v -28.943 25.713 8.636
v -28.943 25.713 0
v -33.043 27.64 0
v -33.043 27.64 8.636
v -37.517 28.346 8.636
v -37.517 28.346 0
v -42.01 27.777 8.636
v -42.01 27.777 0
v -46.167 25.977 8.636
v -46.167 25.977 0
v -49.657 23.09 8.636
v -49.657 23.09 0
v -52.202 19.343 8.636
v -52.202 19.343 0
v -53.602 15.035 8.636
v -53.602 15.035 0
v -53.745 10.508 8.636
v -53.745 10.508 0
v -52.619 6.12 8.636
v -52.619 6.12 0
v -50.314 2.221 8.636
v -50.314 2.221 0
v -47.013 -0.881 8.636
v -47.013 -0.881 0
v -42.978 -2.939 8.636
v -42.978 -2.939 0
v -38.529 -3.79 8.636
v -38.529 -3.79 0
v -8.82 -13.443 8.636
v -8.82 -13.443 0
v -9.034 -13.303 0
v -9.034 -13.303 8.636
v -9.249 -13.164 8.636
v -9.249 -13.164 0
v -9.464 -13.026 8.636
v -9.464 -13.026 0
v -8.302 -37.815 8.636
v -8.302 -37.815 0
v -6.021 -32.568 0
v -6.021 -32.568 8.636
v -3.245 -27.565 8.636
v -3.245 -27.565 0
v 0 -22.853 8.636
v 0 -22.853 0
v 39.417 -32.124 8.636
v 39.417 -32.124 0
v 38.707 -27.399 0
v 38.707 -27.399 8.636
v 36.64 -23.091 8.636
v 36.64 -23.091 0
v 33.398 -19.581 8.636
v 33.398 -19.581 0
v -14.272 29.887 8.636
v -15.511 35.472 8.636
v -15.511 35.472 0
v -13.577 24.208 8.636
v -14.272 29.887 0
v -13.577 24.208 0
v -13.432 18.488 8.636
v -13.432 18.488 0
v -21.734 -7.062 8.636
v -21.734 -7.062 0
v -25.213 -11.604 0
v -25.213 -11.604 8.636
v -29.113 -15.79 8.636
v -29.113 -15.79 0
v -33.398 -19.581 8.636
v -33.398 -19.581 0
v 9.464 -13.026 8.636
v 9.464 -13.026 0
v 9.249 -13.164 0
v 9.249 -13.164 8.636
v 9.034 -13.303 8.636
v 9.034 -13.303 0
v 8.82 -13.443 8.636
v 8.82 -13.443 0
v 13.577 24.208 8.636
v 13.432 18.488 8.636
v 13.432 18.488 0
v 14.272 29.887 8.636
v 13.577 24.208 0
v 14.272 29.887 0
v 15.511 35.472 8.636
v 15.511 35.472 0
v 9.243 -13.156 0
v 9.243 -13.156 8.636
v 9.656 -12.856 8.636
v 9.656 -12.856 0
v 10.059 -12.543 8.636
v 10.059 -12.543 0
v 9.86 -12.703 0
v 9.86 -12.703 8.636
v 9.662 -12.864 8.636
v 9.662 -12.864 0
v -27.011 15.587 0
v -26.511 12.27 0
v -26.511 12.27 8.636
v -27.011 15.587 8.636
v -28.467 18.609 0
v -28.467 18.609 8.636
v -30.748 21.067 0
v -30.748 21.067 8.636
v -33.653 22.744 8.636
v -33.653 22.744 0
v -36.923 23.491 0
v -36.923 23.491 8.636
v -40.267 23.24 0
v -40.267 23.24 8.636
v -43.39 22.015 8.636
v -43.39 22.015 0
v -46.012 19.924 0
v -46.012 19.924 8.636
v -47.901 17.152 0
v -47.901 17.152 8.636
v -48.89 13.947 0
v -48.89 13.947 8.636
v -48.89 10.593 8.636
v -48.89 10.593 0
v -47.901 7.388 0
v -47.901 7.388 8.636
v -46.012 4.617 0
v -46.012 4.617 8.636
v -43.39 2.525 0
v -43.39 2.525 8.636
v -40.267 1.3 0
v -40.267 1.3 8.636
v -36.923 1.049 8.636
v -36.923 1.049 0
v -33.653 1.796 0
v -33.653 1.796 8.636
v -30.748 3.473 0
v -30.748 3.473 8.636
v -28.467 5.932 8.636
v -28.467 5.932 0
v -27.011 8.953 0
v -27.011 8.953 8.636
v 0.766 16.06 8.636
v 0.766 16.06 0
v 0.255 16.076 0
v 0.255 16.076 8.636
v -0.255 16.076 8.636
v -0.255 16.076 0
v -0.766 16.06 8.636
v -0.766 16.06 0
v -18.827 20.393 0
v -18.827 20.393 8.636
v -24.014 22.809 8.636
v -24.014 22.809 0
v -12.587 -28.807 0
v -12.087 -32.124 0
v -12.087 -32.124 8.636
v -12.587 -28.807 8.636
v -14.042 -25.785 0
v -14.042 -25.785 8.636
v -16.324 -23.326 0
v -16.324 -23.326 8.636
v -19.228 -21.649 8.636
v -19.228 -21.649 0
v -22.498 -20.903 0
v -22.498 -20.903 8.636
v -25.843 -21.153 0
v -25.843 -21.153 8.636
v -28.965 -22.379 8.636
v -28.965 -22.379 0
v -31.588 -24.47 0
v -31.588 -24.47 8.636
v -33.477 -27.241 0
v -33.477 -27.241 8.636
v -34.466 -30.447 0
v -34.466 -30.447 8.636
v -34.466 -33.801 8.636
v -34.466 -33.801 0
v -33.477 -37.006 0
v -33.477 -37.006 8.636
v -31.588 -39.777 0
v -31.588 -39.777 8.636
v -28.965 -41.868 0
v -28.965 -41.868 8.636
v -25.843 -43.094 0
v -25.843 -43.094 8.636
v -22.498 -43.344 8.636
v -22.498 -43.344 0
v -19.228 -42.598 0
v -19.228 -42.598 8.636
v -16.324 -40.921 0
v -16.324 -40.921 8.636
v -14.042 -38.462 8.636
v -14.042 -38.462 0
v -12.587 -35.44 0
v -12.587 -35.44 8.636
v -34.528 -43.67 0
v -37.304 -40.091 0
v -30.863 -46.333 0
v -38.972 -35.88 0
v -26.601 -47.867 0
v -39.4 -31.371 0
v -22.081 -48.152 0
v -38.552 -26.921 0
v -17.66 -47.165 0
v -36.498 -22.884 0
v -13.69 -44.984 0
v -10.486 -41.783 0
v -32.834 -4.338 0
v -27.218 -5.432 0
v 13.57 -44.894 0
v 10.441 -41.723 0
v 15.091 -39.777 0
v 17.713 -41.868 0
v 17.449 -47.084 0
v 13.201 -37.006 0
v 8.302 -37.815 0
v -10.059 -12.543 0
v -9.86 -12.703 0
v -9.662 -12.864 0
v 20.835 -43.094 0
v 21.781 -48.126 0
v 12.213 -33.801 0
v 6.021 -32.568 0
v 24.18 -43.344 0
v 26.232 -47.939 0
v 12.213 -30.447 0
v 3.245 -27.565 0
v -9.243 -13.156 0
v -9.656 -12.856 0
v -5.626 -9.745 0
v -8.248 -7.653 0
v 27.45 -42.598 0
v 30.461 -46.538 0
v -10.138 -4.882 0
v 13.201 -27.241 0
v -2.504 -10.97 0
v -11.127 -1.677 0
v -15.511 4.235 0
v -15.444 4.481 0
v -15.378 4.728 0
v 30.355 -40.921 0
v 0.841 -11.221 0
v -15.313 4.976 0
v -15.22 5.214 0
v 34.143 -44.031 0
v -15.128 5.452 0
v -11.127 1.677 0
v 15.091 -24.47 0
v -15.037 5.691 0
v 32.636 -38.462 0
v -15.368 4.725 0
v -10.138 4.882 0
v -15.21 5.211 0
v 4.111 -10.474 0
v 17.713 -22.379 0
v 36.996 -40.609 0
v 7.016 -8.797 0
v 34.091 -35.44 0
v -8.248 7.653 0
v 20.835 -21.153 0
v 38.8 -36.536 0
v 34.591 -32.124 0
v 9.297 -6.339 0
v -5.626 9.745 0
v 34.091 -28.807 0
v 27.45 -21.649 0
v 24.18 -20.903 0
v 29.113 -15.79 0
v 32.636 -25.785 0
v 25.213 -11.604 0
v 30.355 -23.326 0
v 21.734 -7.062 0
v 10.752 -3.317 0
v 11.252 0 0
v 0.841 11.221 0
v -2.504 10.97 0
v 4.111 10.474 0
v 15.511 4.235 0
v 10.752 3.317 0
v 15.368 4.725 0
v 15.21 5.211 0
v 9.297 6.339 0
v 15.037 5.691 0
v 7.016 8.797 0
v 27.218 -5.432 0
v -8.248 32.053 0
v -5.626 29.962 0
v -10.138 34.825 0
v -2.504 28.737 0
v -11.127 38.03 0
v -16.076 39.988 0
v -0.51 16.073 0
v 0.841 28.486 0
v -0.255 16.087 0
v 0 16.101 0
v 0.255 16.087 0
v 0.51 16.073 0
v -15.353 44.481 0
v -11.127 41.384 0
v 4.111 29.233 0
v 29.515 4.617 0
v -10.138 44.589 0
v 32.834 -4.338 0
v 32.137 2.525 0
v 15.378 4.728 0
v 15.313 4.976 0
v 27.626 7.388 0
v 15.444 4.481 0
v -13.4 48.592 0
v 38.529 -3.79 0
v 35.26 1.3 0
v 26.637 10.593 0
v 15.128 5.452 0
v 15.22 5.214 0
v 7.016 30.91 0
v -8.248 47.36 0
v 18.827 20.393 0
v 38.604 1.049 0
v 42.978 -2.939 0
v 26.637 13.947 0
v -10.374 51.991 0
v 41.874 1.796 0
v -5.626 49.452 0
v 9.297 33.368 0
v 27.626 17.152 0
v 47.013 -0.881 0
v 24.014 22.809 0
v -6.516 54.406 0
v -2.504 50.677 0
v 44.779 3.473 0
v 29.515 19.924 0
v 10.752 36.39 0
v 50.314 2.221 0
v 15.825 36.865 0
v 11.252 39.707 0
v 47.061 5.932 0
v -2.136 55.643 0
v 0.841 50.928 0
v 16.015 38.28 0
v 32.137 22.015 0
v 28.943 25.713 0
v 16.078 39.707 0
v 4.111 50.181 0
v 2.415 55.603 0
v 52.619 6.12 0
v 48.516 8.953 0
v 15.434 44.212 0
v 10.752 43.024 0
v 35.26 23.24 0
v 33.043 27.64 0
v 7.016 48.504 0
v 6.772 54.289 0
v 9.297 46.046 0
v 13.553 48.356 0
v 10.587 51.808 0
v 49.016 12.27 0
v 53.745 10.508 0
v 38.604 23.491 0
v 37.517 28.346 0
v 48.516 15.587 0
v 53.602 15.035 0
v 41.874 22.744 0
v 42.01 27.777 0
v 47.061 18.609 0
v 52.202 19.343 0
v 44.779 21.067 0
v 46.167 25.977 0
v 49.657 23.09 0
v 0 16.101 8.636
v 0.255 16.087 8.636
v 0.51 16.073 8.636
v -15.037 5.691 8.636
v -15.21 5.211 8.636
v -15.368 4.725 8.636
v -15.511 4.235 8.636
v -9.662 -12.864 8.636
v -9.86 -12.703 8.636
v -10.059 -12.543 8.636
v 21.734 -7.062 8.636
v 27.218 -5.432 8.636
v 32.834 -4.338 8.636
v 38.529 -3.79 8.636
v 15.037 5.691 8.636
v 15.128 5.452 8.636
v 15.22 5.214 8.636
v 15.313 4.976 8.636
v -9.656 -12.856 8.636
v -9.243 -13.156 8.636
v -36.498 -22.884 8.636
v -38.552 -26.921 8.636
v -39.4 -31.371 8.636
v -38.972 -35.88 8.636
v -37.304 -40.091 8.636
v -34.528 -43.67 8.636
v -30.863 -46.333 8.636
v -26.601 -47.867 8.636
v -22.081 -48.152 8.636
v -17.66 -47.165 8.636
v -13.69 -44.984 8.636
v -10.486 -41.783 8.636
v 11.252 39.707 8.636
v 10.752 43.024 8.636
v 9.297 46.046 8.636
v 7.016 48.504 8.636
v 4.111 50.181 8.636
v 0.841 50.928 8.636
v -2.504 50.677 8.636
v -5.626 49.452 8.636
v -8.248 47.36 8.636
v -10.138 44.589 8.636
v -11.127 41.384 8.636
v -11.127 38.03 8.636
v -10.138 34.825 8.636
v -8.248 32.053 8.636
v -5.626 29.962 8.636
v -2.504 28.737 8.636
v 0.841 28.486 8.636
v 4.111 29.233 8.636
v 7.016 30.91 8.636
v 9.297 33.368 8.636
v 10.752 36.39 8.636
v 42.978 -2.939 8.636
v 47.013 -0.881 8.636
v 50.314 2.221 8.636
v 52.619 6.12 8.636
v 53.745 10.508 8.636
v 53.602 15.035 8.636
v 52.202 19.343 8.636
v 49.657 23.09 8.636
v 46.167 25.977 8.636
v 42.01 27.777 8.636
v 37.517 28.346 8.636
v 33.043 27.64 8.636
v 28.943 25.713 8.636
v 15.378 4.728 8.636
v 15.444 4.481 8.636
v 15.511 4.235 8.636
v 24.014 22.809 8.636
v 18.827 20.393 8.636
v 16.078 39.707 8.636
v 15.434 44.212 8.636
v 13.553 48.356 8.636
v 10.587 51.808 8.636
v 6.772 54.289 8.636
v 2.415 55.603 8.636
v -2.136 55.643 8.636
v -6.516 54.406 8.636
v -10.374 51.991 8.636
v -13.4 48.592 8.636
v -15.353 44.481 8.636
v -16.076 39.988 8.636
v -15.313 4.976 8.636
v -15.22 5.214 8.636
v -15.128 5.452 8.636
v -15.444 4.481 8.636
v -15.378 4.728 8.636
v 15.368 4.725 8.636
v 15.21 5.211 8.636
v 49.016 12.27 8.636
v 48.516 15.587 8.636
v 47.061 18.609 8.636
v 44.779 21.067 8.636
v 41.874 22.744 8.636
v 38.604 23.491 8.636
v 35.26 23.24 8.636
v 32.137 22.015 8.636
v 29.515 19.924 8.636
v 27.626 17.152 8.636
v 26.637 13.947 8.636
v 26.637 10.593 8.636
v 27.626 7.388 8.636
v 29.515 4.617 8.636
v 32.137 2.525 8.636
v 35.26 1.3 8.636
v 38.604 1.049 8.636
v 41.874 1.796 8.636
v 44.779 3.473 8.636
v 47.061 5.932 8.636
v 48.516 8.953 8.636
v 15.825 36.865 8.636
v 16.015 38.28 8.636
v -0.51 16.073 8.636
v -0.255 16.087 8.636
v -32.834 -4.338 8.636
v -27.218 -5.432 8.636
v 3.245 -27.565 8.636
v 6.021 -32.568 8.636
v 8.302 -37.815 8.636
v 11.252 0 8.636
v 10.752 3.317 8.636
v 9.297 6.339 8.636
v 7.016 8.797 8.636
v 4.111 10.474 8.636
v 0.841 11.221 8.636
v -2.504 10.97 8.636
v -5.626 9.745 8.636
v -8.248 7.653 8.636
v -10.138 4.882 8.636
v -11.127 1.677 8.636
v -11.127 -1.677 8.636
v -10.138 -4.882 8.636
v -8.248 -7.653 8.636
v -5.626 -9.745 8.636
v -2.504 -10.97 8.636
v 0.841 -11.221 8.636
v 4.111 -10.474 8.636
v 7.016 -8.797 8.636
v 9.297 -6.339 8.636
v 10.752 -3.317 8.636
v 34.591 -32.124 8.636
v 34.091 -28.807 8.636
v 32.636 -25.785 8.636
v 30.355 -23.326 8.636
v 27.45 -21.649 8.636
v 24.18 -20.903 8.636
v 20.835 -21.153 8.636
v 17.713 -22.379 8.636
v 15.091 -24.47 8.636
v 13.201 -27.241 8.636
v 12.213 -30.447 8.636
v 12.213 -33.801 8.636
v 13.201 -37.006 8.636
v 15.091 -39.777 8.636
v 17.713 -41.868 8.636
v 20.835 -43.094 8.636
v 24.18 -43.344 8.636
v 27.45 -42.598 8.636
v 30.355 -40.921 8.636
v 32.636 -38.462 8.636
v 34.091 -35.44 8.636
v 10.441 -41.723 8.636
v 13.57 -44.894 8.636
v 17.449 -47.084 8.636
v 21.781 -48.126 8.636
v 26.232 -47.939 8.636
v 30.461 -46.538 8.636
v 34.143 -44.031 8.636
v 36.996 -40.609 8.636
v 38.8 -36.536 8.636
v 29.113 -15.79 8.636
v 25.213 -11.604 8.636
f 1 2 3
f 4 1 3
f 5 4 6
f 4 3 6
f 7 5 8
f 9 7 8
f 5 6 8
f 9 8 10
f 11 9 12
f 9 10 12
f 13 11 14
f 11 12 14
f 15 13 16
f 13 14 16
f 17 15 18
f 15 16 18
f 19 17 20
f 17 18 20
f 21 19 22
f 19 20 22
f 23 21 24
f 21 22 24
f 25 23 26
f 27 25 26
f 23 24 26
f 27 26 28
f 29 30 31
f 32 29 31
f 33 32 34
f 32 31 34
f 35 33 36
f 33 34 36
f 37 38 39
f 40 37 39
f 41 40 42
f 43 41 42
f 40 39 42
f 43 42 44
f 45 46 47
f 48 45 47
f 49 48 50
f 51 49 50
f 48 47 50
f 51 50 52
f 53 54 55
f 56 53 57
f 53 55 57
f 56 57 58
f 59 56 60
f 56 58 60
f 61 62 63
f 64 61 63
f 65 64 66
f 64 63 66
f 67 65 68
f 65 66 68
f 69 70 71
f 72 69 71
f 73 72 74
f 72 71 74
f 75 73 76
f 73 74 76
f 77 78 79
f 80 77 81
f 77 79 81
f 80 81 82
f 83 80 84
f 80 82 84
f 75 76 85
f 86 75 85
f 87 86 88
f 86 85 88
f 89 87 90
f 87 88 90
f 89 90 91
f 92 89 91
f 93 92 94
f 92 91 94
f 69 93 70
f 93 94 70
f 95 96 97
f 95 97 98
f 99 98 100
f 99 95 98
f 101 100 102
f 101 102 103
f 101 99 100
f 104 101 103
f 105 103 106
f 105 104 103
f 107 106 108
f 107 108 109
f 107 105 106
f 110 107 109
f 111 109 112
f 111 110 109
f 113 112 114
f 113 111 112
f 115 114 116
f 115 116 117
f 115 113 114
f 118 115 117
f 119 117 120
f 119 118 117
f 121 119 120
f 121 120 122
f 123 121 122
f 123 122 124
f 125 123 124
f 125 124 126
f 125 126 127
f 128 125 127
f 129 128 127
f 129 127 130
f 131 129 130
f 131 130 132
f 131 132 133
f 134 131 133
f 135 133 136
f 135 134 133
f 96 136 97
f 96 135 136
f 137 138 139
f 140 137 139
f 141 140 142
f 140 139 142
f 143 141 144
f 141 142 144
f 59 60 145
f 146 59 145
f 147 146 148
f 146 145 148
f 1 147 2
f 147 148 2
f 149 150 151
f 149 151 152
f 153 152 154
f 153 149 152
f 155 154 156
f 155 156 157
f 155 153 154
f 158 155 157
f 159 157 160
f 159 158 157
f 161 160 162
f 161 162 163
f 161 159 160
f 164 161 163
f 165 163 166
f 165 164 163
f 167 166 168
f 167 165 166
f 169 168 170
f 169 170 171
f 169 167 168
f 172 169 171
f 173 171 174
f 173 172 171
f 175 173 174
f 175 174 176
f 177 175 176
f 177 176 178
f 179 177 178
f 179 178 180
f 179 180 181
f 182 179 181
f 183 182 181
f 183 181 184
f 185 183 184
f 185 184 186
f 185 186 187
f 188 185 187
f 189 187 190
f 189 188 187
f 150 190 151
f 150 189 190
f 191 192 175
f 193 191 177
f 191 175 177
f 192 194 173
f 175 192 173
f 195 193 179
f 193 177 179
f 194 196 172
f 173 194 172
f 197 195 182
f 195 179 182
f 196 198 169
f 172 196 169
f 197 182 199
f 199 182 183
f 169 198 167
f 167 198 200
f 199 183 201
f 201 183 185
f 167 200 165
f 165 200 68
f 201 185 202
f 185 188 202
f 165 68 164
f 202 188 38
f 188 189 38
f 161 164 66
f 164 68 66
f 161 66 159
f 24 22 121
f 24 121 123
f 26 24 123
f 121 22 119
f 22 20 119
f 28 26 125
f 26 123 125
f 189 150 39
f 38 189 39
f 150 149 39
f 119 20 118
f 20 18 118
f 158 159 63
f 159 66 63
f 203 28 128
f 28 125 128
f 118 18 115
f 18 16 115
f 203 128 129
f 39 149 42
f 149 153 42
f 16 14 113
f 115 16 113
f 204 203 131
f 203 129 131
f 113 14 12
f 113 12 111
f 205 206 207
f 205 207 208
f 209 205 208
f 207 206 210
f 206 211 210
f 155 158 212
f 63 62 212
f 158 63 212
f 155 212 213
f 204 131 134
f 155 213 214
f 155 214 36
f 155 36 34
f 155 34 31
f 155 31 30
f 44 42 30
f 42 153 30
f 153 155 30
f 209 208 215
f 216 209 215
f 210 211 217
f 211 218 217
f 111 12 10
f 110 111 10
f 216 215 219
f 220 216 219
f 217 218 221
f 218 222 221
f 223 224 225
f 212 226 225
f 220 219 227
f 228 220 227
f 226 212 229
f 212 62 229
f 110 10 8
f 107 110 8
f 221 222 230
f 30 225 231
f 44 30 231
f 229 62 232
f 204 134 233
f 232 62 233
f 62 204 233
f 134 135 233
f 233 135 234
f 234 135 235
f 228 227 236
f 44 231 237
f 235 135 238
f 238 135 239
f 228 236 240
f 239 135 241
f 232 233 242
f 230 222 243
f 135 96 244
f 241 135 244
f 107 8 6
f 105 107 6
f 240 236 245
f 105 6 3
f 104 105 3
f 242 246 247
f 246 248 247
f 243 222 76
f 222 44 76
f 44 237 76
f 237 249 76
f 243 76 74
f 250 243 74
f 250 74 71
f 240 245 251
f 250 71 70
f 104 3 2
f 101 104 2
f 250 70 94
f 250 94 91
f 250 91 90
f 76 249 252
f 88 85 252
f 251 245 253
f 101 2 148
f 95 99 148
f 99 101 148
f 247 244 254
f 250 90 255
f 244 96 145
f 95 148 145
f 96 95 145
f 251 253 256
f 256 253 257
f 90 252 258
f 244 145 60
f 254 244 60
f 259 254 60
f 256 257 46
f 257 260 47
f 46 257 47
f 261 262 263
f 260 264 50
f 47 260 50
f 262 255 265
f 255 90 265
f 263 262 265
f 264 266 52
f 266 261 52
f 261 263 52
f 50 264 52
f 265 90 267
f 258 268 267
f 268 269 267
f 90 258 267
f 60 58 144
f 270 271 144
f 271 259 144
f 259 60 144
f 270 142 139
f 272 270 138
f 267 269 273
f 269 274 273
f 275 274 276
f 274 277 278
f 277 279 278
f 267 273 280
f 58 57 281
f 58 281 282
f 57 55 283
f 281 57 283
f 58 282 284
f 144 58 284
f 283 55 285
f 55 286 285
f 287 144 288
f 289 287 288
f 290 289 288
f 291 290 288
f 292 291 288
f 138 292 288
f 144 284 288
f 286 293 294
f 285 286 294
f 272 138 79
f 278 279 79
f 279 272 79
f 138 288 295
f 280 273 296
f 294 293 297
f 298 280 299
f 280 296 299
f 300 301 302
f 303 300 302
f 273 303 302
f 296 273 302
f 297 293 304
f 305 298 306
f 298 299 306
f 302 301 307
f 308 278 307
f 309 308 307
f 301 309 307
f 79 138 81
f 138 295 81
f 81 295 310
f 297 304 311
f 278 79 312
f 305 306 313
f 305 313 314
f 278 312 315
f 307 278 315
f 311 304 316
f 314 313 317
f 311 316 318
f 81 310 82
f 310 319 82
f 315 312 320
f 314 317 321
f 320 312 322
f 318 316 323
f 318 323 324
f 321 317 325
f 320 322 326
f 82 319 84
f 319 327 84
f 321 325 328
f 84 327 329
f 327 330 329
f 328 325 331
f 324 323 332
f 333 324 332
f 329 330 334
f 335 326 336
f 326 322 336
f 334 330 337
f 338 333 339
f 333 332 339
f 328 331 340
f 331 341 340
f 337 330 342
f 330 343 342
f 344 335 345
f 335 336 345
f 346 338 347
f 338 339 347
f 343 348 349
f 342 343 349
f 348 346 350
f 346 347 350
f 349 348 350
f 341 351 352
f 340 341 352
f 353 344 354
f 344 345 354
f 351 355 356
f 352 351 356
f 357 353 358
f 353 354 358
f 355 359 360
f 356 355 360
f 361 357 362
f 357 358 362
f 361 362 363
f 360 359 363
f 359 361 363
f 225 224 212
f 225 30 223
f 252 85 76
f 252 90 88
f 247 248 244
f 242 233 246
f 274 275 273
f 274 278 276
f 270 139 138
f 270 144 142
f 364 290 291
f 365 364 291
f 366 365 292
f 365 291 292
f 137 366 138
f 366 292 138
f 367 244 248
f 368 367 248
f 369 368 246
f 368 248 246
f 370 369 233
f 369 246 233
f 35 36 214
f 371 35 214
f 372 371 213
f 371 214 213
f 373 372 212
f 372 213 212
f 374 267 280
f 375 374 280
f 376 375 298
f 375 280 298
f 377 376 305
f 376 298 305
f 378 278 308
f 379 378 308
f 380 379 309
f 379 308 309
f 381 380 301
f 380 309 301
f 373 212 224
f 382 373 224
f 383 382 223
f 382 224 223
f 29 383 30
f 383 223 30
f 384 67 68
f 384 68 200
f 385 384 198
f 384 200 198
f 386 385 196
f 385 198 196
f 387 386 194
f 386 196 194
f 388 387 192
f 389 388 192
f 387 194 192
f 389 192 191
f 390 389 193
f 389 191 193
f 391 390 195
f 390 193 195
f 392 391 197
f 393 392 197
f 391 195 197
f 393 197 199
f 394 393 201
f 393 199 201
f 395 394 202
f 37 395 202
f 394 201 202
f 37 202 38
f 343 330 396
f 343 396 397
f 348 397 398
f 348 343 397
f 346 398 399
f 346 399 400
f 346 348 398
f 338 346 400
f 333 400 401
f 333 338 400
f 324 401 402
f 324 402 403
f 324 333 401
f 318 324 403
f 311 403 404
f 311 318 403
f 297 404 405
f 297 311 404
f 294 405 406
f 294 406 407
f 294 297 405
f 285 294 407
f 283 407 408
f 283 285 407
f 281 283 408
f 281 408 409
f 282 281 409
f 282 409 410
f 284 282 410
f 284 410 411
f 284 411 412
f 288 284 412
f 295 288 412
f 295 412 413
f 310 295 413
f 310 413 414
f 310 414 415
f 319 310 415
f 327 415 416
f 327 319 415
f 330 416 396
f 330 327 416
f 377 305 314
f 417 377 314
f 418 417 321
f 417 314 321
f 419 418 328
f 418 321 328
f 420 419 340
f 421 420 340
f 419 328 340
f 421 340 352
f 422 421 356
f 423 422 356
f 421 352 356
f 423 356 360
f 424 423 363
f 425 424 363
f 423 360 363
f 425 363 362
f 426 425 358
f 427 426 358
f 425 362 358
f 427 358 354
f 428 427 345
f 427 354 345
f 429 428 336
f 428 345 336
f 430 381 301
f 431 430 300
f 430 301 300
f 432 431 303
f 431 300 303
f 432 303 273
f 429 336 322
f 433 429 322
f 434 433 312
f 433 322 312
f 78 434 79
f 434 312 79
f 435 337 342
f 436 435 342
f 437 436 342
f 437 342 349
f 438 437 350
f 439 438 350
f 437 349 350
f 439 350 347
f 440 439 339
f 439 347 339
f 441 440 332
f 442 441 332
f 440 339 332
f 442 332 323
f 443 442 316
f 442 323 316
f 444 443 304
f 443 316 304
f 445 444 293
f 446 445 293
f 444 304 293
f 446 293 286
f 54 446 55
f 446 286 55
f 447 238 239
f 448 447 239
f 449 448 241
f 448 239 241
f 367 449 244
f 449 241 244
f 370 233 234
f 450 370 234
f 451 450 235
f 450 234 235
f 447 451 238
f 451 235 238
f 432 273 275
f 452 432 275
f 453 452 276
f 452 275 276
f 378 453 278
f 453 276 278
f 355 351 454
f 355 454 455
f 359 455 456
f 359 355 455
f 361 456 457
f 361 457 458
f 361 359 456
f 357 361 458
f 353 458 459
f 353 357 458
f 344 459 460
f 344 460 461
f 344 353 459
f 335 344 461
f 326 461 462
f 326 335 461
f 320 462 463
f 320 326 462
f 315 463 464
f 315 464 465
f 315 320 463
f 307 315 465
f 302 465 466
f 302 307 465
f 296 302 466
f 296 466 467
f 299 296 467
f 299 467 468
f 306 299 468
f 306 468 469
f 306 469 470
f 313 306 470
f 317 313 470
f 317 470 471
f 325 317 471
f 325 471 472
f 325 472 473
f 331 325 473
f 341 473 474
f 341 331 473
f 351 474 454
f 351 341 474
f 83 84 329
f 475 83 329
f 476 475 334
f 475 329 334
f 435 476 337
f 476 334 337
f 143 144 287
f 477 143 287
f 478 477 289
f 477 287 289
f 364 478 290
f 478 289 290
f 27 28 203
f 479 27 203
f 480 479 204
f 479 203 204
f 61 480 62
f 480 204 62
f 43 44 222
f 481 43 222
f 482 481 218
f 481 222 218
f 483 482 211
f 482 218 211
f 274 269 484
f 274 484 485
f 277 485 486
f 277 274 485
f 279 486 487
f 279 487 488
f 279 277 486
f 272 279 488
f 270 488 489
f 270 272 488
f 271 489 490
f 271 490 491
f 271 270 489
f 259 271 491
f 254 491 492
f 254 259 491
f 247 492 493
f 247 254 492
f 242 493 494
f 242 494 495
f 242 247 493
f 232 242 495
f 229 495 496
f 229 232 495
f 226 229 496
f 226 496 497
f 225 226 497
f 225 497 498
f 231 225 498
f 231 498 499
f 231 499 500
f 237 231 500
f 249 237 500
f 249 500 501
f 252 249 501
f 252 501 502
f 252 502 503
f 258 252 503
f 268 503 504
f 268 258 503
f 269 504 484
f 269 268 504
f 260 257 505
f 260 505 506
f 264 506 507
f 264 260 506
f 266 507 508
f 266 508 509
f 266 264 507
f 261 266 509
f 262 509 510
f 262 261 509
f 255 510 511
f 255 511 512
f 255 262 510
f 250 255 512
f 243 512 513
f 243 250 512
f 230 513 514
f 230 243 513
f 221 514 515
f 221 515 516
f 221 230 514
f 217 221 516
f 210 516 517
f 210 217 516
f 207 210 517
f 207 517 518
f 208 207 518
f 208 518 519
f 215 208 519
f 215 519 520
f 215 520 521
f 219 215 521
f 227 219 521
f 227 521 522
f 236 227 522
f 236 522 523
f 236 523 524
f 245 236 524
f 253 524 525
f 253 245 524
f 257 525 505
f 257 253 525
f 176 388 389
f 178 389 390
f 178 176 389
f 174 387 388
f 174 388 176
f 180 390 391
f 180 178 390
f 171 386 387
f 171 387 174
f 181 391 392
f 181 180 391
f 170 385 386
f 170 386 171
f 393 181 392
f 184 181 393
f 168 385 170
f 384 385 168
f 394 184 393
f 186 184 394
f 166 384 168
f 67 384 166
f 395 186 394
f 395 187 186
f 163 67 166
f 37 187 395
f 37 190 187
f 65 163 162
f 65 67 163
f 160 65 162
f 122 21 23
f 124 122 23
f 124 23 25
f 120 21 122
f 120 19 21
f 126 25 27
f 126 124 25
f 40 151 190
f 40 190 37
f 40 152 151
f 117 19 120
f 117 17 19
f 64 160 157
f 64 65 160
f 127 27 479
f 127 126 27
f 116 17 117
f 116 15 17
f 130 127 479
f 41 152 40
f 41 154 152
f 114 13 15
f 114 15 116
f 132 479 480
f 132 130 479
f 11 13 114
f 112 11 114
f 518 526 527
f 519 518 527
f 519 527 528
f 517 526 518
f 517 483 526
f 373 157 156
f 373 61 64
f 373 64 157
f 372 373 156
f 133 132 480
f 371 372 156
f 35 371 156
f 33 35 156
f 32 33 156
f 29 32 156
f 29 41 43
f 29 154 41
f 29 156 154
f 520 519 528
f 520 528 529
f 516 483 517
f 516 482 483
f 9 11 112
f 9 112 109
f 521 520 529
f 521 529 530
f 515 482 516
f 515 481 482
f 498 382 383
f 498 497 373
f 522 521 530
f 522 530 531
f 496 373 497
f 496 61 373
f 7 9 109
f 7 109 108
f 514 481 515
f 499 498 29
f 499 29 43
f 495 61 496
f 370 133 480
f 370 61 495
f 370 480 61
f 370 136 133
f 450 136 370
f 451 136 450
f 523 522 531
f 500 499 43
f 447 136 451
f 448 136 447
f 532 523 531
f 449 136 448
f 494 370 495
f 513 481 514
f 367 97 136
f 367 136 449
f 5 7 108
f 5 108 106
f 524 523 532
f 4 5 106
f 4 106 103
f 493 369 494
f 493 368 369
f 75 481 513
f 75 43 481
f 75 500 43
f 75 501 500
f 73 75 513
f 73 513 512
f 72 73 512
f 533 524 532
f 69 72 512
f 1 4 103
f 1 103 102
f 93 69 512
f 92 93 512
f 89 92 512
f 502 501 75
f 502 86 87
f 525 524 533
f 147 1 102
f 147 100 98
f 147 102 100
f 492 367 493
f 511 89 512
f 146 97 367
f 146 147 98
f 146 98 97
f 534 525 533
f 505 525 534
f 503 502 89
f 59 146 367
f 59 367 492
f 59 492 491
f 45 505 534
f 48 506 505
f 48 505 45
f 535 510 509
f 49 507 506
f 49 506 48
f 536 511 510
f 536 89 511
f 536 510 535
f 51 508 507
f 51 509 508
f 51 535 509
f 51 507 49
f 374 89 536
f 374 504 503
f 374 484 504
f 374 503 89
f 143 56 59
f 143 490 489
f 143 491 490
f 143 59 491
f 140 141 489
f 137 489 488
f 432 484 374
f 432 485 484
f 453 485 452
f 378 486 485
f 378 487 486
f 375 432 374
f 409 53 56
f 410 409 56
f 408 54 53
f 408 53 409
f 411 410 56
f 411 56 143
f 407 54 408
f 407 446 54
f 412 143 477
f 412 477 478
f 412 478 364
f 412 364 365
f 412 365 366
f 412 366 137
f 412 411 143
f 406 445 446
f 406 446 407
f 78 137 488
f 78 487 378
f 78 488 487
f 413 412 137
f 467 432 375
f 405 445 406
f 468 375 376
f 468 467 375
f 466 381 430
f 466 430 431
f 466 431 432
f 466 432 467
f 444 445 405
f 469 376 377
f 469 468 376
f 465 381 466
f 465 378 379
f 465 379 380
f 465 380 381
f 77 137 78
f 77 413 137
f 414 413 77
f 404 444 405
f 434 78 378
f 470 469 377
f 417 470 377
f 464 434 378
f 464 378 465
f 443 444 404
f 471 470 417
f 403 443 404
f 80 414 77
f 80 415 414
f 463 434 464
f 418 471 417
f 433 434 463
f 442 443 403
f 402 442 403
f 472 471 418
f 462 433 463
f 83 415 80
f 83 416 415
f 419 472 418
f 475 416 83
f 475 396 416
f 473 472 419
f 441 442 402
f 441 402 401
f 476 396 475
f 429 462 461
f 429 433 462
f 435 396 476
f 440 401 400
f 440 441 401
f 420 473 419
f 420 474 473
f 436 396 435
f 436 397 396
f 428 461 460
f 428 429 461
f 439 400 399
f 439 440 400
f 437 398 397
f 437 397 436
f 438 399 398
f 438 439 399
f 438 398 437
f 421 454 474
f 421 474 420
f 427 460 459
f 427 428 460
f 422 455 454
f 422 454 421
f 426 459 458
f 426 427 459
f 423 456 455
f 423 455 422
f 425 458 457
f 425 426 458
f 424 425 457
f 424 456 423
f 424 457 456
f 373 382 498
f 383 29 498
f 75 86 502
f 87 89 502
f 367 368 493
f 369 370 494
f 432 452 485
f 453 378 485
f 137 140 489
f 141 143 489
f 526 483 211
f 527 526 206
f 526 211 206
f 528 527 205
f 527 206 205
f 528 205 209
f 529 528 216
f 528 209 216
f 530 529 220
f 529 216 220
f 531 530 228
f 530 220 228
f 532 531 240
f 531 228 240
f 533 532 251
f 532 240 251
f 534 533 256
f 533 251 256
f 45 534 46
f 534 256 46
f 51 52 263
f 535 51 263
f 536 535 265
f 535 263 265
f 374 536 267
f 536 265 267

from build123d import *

# Parameters (mm, degrees)
F0_R     = 11.2522
F1_DEPTH = 8.636


with BuildPart() as f1:
    # F0 (on Top) → F1 (new body)
    with BuildSketch(Plane.XY):
        with BuildLine():
            ThreePointArc((10.0592163849, -12.5427541219), (14.4955615296, -6.9560916599), (16.0782, 0))
            ThreePointArc((16.0782, 0), (15.9356487874, 2.1362614454), (15.5105229014, 4.2346422002))
            ThreePointArc((15.5105229014, 4.2346422002), (15.2912768803, 4.968437039), (15.0373368529, 5.6909591117))
            ThreePointArc((15.0373368529, 5.6909591117), (9.4505288434, 13.007537039), (0.7656311095, 16.0599602815))
            ThreePointArc((0.7656311095, 16.0599602815), (0, 16.0782), (-0.7656311095, 16.0599602815))
            ThreePointArc((-0.7656311095, 16.0599602815), (-9.4505288434, 13.007537039), (-15.0373368529, 5.6909591117))
            ThreePointArc((-15.0373368529, 5.6909591117), (-15.2912768803, 4.968437039), (-15.5105229014, 4.2346422002))
            ThreePointArc((-15.5105229014, 4.2346422002), (-15.2912768803, -4.968437039), (-10.0592163849, -12.5427541219))
            ThreePointArc((-10.0592163849, -12.5427541219), (-9.4505288434, -13.007537039), (-8.8203992269, -13.4428074716))
            ThreePointArc((-8.8203992269, -13.4428074716), (0, -16.0782), (8.8203992269, -13.4428074716))
            ThreePointArc((8.8203992269, -13.4428074716), (9.4505288434, -13.007537039), (10.0592163849, -12.5427541219))
        make_face()
        Circle(F0_R, mode=Mode.SUBTRACT)
        with BuildLine():
            ThreePointArc((0.7656311095, 16.0599602815), (9.4505288434, 13.007537039), (15.0373368529, 5.6909591117))
            ThreePointArc((15.0373368529, 5.6909591117), (15.1741938942, 5.3328401038), (15.3133632508, 4.9756133358))
            ThreePointArc((15.3133632508, 4.9756133358), (13.983030327, 11.6776288921), (13.4324519852, 18.4881840601))
            ThreePointArc((13.4324519852, 18.4881840601), (6.7850910488, 16.9072378917), (0, 16.1014229843))
            ThreePointArc((0, 16.1014229843), (0.3827485418, 16.079454203), (0.7656311095, 16.0599602815))
        make_face()
        with BuildLine():
            ThreePointArc((15.5105229014, 4.2346422002), (15.9356487874, 2.1362614454), (16.0782, 0))
            ThreePointArc((16.0782, 0), (14.4955615296, -6.9560916599), (10.0592163849, -12.5427541219))
            ThreePointArc((10.0592163849, -12.5427541219), (9.7609161203, -12.7835777623), (9.4641789711, -13.0263248279))
            ThreePointArc((9.4641789711, -13.0263248279), (15.4270790567, -9.6900663284), (21.7341638644, -7.0618579207))
            ThreePointArc((21.7341638644, -7.0618579207), (18.176447212, -1.2283812192), (15.3133632508, 4.9756133358))
            ThreePointArc((15.3133632508, 4.9756133358), (15.4107455022, 4.6048091142), (15.5105229014, 4.2346422002))
        make_face()
        with BuildLine():
            ThreePointArc((13.4324519852, 18.4881840601), (13.983030327, 11.6776288921), (15.3133632508, 4.9756133358))
            ThreePointArc((15.3133632508, 4.9756133358), (18.176447212, -1.2283812192), (21.7341638644, -7.0618579207))
            ThreePointArc((21.7341638644, -7.0618579207), (30.0130318433, -4.8169203604), (38.5291644649, -3.789844495))
            ThreePointArc((38.5291644649, -3.789844495), (22.4722564751, 7.3016787476), (28.9431341285, 25.7129232581))
            ThreePointArc((28.9431341285, 25.7129232581), (21.4497380646, 21.5381879262), (13.4324519852, 18.4881840601))
        make_face()
        with BuildLine():
            ThreePointArc((53.8417333554, 12.2701157865), (45.4020008846, 26.4179894446), (28.9431341285, 25.7129232581))
            ThreePointArc((28.9431341285, 25.7129232581), (22.4722564751, 7.3016787476), (38.5291644649, -3.789844495))
            ThreePointArc((38.5291644649, -3.789844495), (49.4000810682, 1.1751046298), (53.8417333554, 12.2701157865))
        make_face()
        with Locations((37.7635333554, 12.2701157865)):
            Circle(F0_R, mode=Mode.SUBTRACT)
        with BuildLine():
            ThreePointArc((21.7341638644, -7.0618579207), (15.4270790567, -9.6900663284), (9.4641789711, -13.0263248279))
            ThreePointArc((9.4641789711, -13.0263248279), (4.4485711229, -17.6664192363), (0, -22.8526522788))
            ThreePointArc((0, -22.8526522788), (4.693373395, -30.0325997603), (8.301810296, -37.8145392867))
            ThreePointArc((8.301810296, -37.8145392867), (13.8886183055, -19.1160431361), (33.3983635338, -19.5808260531))
            ThreePointArc((33.3983635338, -19.5808260531), (27.1123675633, -13.7442470619), (21.7341638644, -7.0618579207))
        make_face()
        with BuildLine():
            ThreePointArc((9.4641789711, -13.0263248279), (9.1416159705, -13.2335256587), (8.8203992269, -13.4428074716))
            ThreePointArc((8.8203992269, -13.4428074716), (0, -16.0782), (-8.8203992269, -13.4428074716))
            ThreePointArc((-8.8203992269, -13.4428074716), (-9.1416159705, -13.2335256587), (-9.4641789711, -13.0263248279))
            ThreePointArc((-9.4641789711, -13.0263248279), (-4.4485711229, -17.6664192363), (0, -22.8526522788))
            ThreePointArc((0, -22.8526522788), (4.4485711229, -17.6664192363), (9.4641789711, -13.0263248279))
        make_face()
        with BuildLine():
            ThreePointArc((-8.301810296, -37.8145392867), (-4.693373395, -30.0325997603), (0, -22.8526522788))
            ThreePointArc((0, -22.8526522788), (-4.4485711229, -17.6664192363), (-9.4641789711, -13.0263248279))
            ThreePointArc((-9.4641789711, -13.0263248279), (-15.4270790567, -9.6900663284), (-21.7341638644, -7.0618579207))
            ThreePointArc((-21.7341638644, -7.0618579207), (-27.1123675633, -13.7442470619), (-33.3983635338, -19.5808260531))
            ThreePointArc((-33.3983635338, -19.5808260531), (-16.3830554891, -17.6280186454), (-7.2609471489, -32.123580175))
            ThreePointArc((-7.2609471489, -32.123580175), (-7.5233034372, -35.0162610986), (-8.301810296, -37.8145392867))
        make_face()
        with BuildLine():
            ThreePointArc((-33.3983635338, -19.5808260531), (-32.7896759923, -45.131117214), (-8.301810296, -37.8145392867))
            ThreePointArc((-8.301810296, -37.8145392867), (-7.5233034372, -35.0162610986), (-7.2609471489, -32.123580175))
            ThreePointArc((-7.2609471489, -32.123580175), (-16.3830554891, -17.6280186454), (-33.3983635338, -19.5808260531))
        make_face()
        with Locations((-23.3391471489, -32.123580175)):
            Circle(F0_R, mode=Mode.SUBTRACT)
        with BuildLine():
            ThreePointArc((-9.4641789711, -13.0263248279), (-9.7609161203, -12.7835777623), (-10.0592163849, -12.5427541219))
            ThreePointArc((-10.0592163849, -12.5427541219), (-15.2912768803, -4.968437039), (-15.5105229014, 4.2346422002))
            ThreePointArc((-15.5105229014, 4.2346422002), (-15.4107455022, 4.6048091142), (-15.3133632508, 4.9756133358))
            ThreePointArc((-15.3133632508, 4.9756133358), (-18.176447212, -1.2283812192), (-21.7341638644, -7.0618579207))
            ThreePointArc((-21.7341638644, -7.0618579207), (-15.4270790567, -9.6900663284), (-9.4641789711, -13.0263248279))
        make_face()
        with BuildLine():
            ThreePointArc((39.4173471489, -32.123580175), (37.8347086786, -25.1674885151), (33.3983635338, -19.5808260531))
            ThreePointArc((33.3983635338, -19.5808260531), (13.8886183055, -19.1160431361), (8.301810296, -37.8145392867))
            ThreePointArc((8.301810296, -37.8145392867), (26.2318280725, -47.9394238868), (39.4173471489, -32.123580175))
        make_face()
        with Locations((23.3391471489, -32.123580175)):
            Circle(F0_R, mode=Mode.SUBTRACT)
        with BuildLine():
            ThreePointArc((-21.6853333554, 12.2701157865), (-23.6156596973, 19.9085833157), (-28.9431341285, 25.7129232581))
            ThreePointArc((-28.9431341285, 25.7129232581), (-53.0548102357, 17.2385528255), (-38.5291644649, -3.789844495))
            ThreePointArc((-38.5291644649, -3.789844495), (-26.6685221987, 0.6335680737), (-21.6853333554, 12.2701157865))
        make_face()
        with Locations((-37.7635333554, 12.2701157865)):
            Circle(F0_R, mode=Mode.SUBTRACT)
        with BuildLine():
            ThreePointArc((-15.3133632508, 4.9756133358), (-13.983030327, 11.6776288921), (-13.4324519852, 18.4881840601))
            ThreePointArc((-13.4324519852, 18.4881840601), (-21.4497380646, 21.5381879262), (-28.9431341285, 25.7129232581))
            ThreePointArc((-28.9431341285, 25.7129232581), (-23.6156596973, 19.9085833157), (-21.6853333554, 12.2701157865))
            ThreePointArc((-21.6853333554, 12.2701157865), (-26.6685221987, 0.6335680737), (-38.5291644649, -3.789844495))
            ThreePointArc((-38.5291644649, -3.789844495), (-30.0130318433, -4.8169203604), (-21.7341638644, -7.0618579207))
            ThreePointArc((-21.7341638644, -7.0618579207), (-18.176447212, -1.2283812192), (-15.3133632508, 4.9756133358))
        make_face()
        with BuildLine():
            ThreePointArc((-15.0373368529, 5.6909591117), (-9.4505288434, 13.007537039), (-0.7656311095, 16.0599602815))
            ThreePointArc((-0.7656311095, 16.0599602815), (-0.3827485418, 16.079454203), (0, 16.1014229843))
            ThreePointArc((0, 16.1014229843), (-6.7850910488, 16.9072378917), (-13.4324519852, 18.4881840601))
            ThreePointArc((-13.4324519852, 18.4881840601), (-13.983030327, 11.6776288921), (-15.3133632508, 4.9756133358))
            ThreePointArc((-15.3133632508, 4.9756133358), (-15.1741938942, 5.3328401038), (-15.0373368529, 5.6909591117))
        make_face()
        with BuildLine():
            ThreePointArc((0, 16.1014229843), (6.7850910488, 16.9072378917), (13.4324519852, 18.4881840601))
            ThreePointArc((13.4324519852, 18.4881840601), (13.8557003896, 27.0555792564), (15.5105229014, 35.4722865767))
            ThreePointArc((15.5105229014, 35.4722865767), (0, 23.628728777), (-15.5105229014, 35.4722865767))
            ThreePointArc((-15.5105229014, 35.4722865767), (-13.8557003896, 27.0555792564), (-13.4324519852, 18.4881840601))
            ThreePointArc((-13.4324519852, 18.4881840601), (-6.7850910488, 16.9072378917), (0, 16.1014229843))
        make_face()
        with BuildLine():
            ThreePointArc((-15.5105229014, 35.4722865767), (0, 23.628728777), (15.5105229014, 35.4722865767))
            ThreePointArc((15.5105229014, 35.4722865767), (15.9356487874, 37.5706673316), (16.0782, 39.706928777))
            ThreePointArc((16.0782, 39.706928777), (-2.1362614454, 55.6425775644), (-15.5105229014, 35.4722865767))
        make_face()
        with Locations((0, 39.706928777)):
            Circle(F0_R, mode=Mode.SUBTRACT)
    extrude(amount=F1_DEPTH)


solid = f1.part
